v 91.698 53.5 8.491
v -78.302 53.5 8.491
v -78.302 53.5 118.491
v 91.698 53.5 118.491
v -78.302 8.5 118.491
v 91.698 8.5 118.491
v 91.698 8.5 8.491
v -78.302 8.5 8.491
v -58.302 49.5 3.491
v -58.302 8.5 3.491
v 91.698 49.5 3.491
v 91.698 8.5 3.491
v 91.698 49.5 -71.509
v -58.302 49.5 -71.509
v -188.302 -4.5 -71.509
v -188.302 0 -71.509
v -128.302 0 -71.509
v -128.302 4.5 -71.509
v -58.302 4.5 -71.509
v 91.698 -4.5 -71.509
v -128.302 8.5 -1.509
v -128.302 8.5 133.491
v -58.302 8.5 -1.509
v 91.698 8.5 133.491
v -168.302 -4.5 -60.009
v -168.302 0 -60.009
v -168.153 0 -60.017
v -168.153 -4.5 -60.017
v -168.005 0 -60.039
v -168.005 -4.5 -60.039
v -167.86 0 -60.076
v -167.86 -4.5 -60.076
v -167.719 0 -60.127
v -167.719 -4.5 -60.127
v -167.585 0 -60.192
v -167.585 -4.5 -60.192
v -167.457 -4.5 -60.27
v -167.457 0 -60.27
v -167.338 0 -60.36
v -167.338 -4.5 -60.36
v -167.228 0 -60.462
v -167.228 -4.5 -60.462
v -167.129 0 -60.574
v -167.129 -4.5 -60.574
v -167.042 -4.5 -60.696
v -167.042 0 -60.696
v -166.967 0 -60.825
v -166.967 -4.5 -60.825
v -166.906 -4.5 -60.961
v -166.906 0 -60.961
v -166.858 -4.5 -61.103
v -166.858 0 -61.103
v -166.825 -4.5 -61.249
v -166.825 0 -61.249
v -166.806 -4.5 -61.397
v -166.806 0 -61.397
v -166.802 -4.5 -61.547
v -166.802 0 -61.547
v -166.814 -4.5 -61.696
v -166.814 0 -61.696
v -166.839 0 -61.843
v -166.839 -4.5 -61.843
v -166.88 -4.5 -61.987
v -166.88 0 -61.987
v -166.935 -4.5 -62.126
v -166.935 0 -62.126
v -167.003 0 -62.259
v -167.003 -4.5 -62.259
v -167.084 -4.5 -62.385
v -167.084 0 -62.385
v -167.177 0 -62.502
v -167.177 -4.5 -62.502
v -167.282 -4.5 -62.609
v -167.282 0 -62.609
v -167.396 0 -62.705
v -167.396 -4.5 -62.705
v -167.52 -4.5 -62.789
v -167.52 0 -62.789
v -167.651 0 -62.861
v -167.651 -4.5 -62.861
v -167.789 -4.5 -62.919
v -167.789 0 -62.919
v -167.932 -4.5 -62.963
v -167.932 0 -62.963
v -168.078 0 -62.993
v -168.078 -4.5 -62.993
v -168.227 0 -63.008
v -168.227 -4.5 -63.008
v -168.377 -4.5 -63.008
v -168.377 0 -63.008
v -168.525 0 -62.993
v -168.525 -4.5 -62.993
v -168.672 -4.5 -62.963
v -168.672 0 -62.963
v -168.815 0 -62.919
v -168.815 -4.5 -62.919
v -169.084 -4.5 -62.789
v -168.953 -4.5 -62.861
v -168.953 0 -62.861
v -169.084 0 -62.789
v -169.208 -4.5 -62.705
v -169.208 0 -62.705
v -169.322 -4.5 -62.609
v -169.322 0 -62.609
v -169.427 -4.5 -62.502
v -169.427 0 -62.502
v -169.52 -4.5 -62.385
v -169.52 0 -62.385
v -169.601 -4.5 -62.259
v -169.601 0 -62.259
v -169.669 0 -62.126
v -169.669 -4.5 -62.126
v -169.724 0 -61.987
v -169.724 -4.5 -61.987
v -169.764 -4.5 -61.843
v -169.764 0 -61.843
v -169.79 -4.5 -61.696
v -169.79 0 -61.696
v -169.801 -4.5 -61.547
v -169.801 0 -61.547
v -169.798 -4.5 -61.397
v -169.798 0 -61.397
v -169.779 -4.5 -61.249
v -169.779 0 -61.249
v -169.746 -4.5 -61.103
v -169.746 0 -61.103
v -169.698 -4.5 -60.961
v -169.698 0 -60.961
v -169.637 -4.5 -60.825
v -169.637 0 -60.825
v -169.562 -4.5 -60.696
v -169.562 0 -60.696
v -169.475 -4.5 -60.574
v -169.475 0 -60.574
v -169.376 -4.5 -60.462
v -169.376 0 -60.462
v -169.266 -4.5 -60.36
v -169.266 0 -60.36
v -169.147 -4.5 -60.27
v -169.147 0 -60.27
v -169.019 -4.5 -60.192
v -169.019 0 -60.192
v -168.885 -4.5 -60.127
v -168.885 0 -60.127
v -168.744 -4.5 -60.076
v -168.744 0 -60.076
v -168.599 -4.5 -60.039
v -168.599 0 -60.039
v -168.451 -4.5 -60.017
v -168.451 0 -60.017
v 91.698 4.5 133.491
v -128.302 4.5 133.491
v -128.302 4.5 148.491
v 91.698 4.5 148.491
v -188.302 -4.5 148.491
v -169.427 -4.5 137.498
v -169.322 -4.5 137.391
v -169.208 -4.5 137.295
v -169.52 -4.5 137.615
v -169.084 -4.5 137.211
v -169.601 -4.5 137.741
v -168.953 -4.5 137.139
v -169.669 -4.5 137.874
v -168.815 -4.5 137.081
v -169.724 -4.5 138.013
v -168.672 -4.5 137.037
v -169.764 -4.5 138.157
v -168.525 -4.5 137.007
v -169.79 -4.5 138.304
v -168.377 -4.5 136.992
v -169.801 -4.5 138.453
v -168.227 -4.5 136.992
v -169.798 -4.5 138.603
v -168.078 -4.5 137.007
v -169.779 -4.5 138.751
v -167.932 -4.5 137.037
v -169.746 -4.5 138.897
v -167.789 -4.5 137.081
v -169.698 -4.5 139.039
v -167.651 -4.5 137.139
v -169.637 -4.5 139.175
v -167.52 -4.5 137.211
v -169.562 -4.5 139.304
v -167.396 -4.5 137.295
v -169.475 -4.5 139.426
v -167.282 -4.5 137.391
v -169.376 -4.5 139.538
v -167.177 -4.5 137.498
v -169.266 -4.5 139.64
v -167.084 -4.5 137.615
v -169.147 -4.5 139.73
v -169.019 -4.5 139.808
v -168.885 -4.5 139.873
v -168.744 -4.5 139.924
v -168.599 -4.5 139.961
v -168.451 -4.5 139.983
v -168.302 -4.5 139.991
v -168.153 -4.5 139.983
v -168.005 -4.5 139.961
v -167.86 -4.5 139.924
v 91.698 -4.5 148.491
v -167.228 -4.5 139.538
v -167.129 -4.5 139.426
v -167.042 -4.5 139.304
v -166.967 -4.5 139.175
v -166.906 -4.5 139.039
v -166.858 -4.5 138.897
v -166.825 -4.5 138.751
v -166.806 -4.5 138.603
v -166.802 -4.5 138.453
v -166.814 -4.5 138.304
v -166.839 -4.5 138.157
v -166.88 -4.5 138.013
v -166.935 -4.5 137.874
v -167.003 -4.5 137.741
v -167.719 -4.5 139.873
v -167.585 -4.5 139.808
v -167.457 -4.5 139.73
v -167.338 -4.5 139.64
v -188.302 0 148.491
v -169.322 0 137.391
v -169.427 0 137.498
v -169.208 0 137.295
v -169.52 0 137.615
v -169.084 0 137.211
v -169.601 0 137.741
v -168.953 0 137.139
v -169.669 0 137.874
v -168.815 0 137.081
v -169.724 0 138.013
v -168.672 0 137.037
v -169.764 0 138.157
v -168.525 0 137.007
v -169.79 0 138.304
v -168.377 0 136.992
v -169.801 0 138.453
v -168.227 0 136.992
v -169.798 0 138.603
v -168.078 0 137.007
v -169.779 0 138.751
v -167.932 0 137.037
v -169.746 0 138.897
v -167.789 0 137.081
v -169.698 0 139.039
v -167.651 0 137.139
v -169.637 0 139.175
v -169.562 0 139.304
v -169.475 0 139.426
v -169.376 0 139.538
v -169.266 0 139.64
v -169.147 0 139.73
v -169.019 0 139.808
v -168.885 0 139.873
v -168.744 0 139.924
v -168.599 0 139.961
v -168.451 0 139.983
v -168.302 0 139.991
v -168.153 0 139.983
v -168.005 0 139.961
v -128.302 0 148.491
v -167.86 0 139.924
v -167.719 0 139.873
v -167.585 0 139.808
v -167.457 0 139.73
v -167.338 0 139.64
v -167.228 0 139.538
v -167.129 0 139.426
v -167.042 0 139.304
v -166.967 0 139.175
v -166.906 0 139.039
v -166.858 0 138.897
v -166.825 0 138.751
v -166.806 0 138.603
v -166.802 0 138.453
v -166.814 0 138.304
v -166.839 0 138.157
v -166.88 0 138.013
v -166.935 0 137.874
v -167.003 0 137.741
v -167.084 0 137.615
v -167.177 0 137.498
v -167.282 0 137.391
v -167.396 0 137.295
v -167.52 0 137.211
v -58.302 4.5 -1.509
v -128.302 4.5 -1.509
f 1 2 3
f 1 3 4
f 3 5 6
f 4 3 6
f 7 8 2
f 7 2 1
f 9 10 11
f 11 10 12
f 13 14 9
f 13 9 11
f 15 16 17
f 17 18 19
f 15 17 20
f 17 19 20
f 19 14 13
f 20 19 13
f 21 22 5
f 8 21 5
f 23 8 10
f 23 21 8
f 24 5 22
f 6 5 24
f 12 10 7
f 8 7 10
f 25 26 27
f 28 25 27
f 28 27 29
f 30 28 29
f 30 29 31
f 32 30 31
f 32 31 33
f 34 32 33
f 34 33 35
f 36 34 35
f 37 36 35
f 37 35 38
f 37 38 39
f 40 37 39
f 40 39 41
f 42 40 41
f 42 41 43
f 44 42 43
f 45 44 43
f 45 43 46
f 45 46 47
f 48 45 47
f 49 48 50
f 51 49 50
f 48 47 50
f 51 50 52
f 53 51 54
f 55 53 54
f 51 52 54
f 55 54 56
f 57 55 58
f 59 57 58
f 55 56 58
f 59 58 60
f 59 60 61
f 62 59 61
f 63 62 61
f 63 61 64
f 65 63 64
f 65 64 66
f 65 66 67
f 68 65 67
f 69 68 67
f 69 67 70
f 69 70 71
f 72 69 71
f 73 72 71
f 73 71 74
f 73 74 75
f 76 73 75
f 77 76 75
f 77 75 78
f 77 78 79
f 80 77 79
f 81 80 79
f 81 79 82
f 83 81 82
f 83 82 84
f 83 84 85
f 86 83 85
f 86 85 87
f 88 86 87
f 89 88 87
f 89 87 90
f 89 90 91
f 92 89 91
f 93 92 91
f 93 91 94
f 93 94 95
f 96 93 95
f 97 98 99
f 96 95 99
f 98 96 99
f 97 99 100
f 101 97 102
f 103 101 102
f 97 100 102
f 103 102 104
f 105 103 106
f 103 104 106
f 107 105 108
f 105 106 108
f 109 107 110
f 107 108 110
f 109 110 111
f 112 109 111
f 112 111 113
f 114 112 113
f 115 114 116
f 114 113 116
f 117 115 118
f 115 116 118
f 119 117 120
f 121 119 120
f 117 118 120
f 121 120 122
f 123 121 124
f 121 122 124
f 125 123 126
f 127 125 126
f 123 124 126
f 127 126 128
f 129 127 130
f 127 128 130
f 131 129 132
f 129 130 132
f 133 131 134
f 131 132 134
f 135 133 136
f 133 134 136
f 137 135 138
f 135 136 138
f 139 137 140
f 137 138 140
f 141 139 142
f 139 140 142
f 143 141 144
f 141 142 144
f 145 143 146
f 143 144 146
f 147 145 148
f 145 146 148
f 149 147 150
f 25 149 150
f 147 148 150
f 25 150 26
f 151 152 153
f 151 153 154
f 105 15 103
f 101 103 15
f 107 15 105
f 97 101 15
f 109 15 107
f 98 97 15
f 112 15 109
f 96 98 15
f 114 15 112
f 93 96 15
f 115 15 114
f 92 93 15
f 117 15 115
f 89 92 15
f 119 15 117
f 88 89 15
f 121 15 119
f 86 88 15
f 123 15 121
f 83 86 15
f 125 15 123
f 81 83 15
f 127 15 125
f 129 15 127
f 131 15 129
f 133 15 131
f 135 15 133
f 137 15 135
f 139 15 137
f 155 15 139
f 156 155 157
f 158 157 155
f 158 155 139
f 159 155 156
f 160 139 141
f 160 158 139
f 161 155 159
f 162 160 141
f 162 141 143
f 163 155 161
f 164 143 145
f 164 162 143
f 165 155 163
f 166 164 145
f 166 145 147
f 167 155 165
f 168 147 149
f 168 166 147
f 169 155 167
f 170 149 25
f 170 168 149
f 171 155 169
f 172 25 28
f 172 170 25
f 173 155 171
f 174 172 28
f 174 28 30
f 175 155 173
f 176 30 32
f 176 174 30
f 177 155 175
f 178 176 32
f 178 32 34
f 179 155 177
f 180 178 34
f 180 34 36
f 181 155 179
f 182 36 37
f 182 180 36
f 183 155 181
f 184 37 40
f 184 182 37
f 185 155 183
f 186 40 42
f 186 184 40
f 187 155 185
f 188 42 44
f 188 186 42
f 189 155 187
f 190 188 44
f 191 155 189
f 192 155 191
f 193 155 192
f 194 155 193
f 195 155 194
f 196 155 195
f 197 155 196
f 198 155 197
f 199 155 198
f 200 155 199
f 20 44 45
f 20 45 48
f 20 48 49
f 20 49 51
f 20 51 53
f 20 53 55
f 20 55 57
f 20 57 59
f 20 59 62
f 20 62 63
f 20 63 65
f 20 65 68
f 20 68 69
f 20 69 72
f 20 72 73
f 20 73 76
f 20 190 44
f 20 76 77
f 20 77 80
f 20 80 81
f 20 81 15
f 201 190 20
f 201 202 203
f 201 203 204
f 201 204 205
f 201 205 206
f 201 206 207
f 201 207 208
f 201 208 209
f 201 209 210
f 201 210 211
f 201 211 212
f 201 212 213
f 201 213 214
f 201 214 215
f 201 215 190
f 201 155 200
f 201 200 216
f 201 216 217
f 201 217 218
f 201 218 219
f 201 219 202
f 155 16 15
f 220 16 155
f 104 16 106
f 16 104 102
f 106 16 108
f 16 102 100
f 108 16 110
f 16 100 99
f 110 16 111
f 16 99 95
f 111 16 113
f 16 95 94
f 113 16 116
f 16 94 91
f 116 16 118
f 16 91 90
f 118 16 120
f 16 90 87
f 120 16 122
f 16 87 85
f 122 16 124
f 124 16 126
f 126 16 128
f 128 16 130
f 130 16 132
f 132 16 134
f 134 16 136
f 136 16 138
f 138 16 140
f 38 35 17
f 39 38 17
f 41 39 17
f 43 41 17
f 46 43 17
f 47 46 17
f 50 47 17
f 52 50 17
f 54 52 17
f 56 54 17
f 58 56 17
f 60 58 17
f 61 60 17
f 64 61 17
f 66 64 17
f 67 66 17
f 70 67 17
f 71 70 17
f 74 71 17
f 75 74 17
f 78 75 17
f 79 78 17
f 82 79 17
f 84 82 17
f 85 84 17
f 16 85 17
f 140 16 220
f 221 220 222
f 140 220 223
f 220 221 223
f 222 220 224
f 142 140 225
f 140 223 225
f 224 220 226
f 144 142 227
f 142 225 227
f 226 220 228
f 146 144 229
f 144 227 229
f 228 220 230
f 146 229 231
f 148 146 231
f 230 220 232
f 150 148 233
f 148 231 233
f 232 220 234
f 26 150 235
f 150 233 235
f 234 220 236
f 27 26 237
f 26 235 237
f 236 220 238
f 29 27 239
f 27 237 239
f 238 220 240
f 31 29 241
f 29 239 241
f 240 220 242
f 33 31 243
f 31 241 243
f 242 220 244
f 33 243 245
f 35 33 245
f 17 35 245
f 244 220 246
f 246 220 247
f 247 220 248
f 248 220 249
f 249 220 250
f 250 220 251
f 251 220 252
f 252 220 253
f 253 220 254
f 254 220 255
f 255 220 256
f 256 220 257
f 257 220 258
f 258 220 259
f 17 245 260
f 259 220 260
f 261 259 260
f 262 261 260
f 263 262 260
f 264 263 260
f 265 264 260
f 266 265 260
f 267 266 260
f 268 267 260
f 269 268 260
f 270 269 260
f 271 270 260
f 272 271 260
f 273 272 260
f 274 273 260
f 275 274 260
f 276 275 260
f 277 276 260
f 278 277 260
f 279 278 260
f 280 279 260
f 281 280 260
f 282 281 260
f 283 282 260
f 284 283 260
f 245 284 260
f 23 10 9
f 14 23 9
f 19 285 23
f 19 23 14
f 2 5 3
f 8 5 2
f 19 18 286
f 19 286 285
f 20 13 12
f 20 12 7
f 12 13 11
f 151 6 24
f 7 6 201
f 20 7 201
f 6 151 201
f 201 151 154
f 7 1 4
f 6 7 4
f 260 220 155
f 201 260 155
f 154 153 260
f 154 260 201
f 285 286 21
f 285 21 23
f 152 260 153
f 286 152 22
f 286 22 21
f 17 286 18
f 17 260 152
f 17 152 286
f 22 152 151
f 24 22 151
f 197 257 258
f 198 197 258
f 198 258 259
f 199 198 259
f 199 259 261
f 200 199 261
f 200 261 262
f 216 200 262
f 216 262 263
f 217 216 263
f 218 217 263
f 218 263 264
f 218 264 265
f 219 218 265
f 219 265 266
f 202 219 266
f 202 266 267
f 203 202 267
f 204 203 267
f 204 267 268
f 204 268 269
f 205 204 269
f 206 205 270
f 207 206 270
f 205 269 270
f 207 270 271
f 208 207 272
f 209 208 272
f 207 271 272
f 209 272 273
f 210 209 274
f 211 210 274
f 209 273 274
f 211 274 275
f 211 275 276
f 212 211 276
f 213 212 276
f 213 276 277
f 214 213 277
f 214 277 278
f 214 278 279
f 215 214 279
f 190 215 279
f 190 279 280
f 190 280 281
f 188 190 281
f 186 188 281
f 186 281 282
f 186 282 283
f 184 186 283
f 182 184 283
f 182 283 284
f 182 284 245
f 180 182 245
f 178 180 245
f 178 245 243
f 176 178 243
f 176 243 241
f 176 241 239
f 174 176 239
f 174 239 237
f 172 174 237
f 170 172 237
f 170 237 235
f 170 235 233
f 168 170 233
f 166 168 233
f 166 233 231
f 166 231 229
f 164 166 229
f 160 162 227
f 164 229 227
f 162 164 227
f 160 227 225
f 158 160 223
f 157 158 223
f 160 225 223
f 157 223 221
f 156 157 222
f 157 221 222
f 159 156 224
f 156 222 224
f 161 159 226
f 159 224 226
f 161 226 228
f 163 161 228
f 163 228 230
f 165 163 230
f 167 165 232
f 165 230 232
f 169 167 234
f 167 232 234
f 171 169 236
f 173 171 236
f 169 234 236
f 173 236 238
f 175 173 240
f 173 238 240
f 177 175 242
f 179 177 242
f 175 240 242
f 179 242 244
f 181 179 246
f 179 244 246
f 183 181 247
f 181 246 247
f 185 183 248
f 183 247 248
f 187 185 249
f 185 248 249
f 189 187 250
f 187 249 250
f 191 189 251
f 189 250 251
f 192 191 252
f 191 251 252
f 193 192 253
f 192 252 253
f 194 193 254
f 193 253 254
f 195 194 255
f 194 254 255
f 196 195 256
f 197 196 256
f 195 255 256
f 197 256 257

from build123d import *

# Parameters (mm, degrees)
SKETCH1_W           = 220
SKETCH1_H           = 220
BOSS_EXTRUDE1_DEPTH = 4.5
SKETCH2_W           = 220
SKETCH2_H           = 135
BOSS_EXTRUDE2_DEPTH = 4
SKETCH3_W           = 150
SKETCH3_H           = 75
BOSS_EXTRUDE3_DEPTH = 45
SKETCH4_W           = 170
SKETCH4_H           = 110
BOSS_EXTRUDE4_DEPTH = 45
SKETCH5_W           = 280
SKETCH5_H           = 220
BOSS_EXTRUDE5_DEPTH = 4.5
SKETCH6_R           = 1.5
CUT_EXTRUDE1_DEPTH  = 10


with BuildPart() as part:
    # Sketch1 → Boss-Extrude1 (new body)
    with BuildSketch(Plane(origin=(0, 0, 0), x_dir=(1, 0, 0), z_dir=(0, 1, 0))):
        with Locations((-18.301886792, -38.490566038)):
            Rectangle(SKETCH1_W, SKETCH1_H)
    extrude(amount=BOSS_EXTRUDE1_DEPTH)

    # Sketch2 → Boss-Extrude2 (add)
    with BuildSketch(Plane(origin=(0, 4.5, 0), x_dir=(1, 0, 0), z_dir=(0, 1, 0))):
        with Locations((-18.301886792, -65.990566038)):
            Rectangle(SKETCH2_W, SKETCH2_H)
    extrude(amount=BOSS_EXTRUDE2_DEPTH)

    # Sketch3 → Boss-Extrude3 (add)
    with BuildSketch(Plane(origin=(0, 4.5, 0), x_dir=(1, 0, 0), z_dir=(0, 1, 0))):
        with Locations((16.698113208, 34.009433962)):
            Rectangle(SKETCH3_W, SKETCH3_H)
    extrude(amount=BOSS_EXTRUDE3_DEPTH)

    # Sketch4 → Boss-Extrude4 (add)
    with BuildSketch(Plane(origin=(0, 8.5, 0), x_dir=(1, 0, 0), z_dir=(0, 1, 0))):
        with Locations((6.698113208, -63.490566038)):
            Rectangle(SKETCH4_W, SKETCH4_H)
    extrude(amount=BOSS_EXTRUDE4_DEPTH)

    # Sketch5 → Boss-Extrude5 (add)
    with BuildSketch(Plane.XZ):
        with Locations((-48.301886792, 38.490566038)):
            Rectangle(SKETCH5_W, SKETCH5_H)
    extrude(amount=BOSS_EXTRUDE5_DEPTH)

    # Sketch6 → Cut-Extrude1 (cut)
    with BuildSketch(Plane(origin=(0, 0, 0), x_dir=(1, 0, 0), z_dir=(0, 1, 0))):
        with Locations(Location((-168.301886792, 61.509433962, 0), (0, 0, 270))):
            Circle(SKETCH6_R)
        with Locations(Location((-168.301886792, -138.490566038, 0), (0, 0, 270))):
            Circle(SKETCH6_R)
    extrude(amount=-CUT_EXTRUDE1_DEPTH, mode=Mode.SUBTRACT)


solid = part.part
